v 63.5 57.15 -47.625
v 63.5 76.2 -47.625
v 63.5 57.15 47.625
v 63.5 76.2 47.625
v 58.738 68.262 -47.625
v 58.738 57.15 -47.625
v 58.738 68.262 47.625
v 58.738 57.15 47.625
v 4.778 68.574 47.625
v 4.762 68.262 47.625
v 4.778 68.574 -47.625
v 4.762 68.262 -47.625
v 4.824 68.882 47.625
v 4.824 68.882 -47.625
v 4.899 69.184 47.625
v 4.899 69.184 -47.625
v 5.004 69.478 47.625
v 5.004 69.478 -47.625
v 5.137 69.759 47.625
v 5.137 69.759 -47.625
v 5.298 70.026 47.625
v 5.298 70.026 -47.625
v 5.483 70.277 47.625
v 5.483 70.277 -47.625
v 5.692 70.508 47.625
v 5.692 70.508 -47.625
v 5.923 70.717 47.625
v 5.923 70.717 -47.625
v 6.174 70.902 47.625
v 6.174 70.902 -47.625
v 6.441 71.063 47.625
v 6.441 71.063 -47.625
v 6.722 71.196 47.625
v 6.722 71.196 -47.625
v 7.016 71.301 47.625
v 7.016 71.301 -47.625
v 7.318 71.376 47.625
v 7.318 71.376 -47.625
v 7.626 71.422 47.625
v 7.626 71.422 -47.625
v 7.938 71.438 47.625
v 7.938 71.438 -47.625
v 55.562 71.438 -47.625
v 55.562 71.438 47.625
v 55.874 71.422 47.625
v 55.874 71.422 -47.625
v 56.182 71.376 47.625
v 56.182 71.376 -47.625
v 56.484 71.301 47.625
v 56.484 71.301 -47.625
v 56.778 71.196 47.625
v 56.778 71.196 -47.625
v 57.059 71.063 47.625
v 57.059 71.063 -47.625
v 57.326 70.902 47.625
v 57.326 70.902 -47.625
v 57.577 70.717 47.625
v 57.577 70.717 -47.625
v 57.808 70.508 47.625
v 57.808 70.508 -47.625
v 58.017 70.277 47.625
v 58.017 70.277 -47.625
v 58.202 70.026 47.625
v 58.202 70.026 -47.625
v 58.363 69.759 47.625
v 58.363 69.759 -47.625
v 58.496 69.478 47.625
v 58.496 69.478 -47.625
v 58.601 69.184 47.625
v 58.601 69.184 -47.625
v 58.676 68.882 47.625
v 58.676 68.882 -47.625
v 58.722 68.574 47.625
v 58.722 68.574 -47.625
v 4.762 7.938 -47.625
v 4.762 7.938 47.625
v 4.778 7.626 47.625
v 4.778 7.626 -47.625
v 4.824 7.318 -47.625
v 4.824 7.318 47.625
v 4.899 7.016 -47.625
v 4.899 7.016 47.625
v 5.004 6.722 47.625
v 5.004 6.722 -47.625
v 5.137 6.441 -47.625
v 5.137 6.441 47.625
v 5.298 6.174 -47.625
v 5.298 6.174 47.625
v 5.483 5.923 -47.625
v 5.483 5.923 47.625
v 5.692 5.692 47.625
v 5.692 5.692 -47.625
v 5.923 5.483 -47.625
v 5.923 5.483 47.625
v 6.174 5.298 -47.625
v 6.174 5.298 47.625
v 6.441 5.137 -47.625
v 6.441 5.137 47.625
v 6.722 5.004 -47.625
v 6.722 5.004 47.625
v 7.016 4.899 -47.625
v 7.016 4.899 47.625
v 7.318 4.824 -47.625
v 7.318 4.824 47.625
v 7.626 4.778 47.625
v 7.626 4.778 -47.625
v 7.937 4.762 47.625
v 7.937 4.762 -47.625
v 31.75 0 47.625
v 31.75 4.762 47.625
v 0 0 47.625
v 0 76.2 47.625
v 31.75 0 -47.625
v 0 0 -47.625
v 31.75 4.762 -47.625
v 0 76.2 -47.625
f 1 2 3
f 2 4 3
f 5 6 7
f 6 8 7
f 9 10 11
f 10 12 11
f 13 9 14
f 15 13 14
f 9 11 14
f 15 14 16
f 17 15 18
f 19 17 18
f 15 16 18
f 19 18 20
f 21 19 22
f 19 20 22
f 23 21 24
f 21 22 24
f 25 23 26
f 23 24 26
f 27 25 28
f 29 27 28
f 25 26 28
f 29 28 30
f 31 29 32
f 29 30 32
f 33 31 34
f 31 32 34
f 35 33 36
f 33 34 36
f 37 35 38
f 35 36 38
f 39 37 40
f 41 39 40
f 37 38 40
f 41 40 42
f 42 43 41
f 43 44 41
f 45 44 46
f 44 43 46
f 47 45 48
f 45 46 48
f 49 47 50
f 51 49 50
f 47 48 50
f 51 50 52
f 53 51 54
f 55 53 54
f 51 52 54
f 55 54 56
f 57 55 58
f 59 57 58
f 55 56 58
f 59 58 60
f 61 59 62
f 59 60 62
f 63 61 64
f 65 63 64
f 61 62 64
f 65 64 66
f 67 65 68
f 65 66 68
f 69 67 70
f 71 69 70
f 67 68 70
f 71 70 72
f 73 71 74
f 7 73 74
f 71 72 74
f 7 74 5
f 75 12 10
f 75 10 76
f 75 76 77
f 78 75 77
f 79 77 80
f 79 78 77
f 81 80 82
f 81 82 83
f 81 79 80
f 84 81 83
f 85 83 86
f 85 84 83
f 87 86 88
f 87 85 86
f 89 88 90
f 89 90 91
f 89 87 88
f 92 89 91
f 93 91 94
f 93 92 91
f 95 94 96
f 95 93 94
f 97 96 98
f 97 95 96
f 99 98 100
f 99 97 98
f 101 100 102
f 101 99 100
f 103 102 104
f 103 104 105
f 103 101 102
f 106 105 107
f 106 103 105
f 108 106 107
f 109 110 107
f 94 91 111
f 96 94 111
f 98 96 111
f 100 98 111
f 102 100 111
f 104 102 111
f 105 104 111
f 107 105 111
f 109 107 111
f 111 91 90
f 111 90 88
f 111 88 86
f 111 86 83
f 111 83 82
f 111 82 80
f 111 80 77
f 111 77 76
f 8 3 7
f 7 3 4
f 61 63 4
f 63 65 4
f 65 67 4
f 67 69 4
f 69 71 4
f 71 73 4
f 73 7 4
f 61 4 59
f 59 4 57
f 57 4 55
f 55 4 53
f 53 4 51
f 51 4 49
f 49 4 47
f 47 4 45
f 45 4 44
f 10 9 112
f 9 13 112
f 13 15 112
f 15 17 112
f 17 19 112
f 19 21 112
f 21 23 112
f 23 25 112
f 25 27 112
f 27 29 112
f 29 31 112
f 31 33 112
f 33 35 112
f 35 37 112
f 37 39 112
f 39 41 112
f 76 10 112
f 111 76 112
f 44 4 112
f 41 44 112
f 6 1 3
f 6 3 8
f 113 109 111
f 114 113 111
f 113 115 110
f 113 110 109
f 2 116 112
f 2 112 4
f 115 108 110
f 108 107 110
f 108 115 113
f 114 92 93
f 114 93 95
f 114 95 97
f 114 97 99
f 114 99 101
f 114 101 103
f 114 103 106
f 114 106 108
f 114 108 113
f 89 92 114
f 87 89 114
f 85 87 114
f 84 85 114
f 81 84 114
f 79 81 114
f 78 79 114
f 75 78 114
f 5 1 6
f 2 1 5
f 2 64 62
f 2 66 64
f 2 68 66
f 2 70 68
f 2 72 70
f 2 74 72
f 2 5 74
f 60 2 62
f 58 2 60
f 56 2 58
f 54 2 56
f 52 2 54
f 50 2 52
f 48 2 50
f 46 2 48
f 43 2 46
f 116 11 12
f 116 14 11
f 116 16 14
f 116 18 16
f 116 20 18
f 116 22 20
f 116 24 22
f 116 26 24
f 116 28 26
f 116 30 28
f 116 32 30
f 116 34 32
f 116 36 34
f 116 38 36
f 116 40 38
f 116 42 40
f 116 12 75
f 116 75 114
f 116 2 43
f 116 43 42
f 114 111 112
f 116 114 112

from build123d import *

# Parameters (mm, degrees)
BOSS_EXTRUDE1_DEPTH = 47.625
FILLET1_R           = 3.175
FILLET2_R           = 3.175
FILLET3_R           = 3.175


with BuildPart() as part:
    # Sketch2 → Boss-Extrude1 (new, symmetric)
    with BuildSketch(Plane.XY):
        Polygon((0, 0), (0, 76.2), (63.5, 76.2), (63.5, 57.15), (58.7375, 57.15), (58.7375, 71.4375), (4.7625, 71.4375), (4.7625, 4.7625), (31.75, 4.7625), (31.75, 0), align=None)
    extrude(amount=BOSS_EXTRUDE1_DEPTH, both=True)

    # Fillet1
    fillet1_edges = [part.edges().sort_by_distance(p)[0] for p in [
        (4.7625, 71.4375, 0),
    ]]
    fillet(fillet1_edges, radius=FILLET1_R)

    # Fillet2
    fillet2_edges = [part.edges().sort_by_distance(p)[0] for p in [
        (4.7625, 4.7625, 0),
    ]]
    fillet(fillet2_edges, radius=FILLET2_R)

    # Fillet3
    fillet3_edges = [part.edges().sort_by_distance(p)[0] for p in [
        (58.7375, 71.4375, 0),
    ]]
    fillet(fillet3_edges, radius=FILLET3_R)


solid = part.part
